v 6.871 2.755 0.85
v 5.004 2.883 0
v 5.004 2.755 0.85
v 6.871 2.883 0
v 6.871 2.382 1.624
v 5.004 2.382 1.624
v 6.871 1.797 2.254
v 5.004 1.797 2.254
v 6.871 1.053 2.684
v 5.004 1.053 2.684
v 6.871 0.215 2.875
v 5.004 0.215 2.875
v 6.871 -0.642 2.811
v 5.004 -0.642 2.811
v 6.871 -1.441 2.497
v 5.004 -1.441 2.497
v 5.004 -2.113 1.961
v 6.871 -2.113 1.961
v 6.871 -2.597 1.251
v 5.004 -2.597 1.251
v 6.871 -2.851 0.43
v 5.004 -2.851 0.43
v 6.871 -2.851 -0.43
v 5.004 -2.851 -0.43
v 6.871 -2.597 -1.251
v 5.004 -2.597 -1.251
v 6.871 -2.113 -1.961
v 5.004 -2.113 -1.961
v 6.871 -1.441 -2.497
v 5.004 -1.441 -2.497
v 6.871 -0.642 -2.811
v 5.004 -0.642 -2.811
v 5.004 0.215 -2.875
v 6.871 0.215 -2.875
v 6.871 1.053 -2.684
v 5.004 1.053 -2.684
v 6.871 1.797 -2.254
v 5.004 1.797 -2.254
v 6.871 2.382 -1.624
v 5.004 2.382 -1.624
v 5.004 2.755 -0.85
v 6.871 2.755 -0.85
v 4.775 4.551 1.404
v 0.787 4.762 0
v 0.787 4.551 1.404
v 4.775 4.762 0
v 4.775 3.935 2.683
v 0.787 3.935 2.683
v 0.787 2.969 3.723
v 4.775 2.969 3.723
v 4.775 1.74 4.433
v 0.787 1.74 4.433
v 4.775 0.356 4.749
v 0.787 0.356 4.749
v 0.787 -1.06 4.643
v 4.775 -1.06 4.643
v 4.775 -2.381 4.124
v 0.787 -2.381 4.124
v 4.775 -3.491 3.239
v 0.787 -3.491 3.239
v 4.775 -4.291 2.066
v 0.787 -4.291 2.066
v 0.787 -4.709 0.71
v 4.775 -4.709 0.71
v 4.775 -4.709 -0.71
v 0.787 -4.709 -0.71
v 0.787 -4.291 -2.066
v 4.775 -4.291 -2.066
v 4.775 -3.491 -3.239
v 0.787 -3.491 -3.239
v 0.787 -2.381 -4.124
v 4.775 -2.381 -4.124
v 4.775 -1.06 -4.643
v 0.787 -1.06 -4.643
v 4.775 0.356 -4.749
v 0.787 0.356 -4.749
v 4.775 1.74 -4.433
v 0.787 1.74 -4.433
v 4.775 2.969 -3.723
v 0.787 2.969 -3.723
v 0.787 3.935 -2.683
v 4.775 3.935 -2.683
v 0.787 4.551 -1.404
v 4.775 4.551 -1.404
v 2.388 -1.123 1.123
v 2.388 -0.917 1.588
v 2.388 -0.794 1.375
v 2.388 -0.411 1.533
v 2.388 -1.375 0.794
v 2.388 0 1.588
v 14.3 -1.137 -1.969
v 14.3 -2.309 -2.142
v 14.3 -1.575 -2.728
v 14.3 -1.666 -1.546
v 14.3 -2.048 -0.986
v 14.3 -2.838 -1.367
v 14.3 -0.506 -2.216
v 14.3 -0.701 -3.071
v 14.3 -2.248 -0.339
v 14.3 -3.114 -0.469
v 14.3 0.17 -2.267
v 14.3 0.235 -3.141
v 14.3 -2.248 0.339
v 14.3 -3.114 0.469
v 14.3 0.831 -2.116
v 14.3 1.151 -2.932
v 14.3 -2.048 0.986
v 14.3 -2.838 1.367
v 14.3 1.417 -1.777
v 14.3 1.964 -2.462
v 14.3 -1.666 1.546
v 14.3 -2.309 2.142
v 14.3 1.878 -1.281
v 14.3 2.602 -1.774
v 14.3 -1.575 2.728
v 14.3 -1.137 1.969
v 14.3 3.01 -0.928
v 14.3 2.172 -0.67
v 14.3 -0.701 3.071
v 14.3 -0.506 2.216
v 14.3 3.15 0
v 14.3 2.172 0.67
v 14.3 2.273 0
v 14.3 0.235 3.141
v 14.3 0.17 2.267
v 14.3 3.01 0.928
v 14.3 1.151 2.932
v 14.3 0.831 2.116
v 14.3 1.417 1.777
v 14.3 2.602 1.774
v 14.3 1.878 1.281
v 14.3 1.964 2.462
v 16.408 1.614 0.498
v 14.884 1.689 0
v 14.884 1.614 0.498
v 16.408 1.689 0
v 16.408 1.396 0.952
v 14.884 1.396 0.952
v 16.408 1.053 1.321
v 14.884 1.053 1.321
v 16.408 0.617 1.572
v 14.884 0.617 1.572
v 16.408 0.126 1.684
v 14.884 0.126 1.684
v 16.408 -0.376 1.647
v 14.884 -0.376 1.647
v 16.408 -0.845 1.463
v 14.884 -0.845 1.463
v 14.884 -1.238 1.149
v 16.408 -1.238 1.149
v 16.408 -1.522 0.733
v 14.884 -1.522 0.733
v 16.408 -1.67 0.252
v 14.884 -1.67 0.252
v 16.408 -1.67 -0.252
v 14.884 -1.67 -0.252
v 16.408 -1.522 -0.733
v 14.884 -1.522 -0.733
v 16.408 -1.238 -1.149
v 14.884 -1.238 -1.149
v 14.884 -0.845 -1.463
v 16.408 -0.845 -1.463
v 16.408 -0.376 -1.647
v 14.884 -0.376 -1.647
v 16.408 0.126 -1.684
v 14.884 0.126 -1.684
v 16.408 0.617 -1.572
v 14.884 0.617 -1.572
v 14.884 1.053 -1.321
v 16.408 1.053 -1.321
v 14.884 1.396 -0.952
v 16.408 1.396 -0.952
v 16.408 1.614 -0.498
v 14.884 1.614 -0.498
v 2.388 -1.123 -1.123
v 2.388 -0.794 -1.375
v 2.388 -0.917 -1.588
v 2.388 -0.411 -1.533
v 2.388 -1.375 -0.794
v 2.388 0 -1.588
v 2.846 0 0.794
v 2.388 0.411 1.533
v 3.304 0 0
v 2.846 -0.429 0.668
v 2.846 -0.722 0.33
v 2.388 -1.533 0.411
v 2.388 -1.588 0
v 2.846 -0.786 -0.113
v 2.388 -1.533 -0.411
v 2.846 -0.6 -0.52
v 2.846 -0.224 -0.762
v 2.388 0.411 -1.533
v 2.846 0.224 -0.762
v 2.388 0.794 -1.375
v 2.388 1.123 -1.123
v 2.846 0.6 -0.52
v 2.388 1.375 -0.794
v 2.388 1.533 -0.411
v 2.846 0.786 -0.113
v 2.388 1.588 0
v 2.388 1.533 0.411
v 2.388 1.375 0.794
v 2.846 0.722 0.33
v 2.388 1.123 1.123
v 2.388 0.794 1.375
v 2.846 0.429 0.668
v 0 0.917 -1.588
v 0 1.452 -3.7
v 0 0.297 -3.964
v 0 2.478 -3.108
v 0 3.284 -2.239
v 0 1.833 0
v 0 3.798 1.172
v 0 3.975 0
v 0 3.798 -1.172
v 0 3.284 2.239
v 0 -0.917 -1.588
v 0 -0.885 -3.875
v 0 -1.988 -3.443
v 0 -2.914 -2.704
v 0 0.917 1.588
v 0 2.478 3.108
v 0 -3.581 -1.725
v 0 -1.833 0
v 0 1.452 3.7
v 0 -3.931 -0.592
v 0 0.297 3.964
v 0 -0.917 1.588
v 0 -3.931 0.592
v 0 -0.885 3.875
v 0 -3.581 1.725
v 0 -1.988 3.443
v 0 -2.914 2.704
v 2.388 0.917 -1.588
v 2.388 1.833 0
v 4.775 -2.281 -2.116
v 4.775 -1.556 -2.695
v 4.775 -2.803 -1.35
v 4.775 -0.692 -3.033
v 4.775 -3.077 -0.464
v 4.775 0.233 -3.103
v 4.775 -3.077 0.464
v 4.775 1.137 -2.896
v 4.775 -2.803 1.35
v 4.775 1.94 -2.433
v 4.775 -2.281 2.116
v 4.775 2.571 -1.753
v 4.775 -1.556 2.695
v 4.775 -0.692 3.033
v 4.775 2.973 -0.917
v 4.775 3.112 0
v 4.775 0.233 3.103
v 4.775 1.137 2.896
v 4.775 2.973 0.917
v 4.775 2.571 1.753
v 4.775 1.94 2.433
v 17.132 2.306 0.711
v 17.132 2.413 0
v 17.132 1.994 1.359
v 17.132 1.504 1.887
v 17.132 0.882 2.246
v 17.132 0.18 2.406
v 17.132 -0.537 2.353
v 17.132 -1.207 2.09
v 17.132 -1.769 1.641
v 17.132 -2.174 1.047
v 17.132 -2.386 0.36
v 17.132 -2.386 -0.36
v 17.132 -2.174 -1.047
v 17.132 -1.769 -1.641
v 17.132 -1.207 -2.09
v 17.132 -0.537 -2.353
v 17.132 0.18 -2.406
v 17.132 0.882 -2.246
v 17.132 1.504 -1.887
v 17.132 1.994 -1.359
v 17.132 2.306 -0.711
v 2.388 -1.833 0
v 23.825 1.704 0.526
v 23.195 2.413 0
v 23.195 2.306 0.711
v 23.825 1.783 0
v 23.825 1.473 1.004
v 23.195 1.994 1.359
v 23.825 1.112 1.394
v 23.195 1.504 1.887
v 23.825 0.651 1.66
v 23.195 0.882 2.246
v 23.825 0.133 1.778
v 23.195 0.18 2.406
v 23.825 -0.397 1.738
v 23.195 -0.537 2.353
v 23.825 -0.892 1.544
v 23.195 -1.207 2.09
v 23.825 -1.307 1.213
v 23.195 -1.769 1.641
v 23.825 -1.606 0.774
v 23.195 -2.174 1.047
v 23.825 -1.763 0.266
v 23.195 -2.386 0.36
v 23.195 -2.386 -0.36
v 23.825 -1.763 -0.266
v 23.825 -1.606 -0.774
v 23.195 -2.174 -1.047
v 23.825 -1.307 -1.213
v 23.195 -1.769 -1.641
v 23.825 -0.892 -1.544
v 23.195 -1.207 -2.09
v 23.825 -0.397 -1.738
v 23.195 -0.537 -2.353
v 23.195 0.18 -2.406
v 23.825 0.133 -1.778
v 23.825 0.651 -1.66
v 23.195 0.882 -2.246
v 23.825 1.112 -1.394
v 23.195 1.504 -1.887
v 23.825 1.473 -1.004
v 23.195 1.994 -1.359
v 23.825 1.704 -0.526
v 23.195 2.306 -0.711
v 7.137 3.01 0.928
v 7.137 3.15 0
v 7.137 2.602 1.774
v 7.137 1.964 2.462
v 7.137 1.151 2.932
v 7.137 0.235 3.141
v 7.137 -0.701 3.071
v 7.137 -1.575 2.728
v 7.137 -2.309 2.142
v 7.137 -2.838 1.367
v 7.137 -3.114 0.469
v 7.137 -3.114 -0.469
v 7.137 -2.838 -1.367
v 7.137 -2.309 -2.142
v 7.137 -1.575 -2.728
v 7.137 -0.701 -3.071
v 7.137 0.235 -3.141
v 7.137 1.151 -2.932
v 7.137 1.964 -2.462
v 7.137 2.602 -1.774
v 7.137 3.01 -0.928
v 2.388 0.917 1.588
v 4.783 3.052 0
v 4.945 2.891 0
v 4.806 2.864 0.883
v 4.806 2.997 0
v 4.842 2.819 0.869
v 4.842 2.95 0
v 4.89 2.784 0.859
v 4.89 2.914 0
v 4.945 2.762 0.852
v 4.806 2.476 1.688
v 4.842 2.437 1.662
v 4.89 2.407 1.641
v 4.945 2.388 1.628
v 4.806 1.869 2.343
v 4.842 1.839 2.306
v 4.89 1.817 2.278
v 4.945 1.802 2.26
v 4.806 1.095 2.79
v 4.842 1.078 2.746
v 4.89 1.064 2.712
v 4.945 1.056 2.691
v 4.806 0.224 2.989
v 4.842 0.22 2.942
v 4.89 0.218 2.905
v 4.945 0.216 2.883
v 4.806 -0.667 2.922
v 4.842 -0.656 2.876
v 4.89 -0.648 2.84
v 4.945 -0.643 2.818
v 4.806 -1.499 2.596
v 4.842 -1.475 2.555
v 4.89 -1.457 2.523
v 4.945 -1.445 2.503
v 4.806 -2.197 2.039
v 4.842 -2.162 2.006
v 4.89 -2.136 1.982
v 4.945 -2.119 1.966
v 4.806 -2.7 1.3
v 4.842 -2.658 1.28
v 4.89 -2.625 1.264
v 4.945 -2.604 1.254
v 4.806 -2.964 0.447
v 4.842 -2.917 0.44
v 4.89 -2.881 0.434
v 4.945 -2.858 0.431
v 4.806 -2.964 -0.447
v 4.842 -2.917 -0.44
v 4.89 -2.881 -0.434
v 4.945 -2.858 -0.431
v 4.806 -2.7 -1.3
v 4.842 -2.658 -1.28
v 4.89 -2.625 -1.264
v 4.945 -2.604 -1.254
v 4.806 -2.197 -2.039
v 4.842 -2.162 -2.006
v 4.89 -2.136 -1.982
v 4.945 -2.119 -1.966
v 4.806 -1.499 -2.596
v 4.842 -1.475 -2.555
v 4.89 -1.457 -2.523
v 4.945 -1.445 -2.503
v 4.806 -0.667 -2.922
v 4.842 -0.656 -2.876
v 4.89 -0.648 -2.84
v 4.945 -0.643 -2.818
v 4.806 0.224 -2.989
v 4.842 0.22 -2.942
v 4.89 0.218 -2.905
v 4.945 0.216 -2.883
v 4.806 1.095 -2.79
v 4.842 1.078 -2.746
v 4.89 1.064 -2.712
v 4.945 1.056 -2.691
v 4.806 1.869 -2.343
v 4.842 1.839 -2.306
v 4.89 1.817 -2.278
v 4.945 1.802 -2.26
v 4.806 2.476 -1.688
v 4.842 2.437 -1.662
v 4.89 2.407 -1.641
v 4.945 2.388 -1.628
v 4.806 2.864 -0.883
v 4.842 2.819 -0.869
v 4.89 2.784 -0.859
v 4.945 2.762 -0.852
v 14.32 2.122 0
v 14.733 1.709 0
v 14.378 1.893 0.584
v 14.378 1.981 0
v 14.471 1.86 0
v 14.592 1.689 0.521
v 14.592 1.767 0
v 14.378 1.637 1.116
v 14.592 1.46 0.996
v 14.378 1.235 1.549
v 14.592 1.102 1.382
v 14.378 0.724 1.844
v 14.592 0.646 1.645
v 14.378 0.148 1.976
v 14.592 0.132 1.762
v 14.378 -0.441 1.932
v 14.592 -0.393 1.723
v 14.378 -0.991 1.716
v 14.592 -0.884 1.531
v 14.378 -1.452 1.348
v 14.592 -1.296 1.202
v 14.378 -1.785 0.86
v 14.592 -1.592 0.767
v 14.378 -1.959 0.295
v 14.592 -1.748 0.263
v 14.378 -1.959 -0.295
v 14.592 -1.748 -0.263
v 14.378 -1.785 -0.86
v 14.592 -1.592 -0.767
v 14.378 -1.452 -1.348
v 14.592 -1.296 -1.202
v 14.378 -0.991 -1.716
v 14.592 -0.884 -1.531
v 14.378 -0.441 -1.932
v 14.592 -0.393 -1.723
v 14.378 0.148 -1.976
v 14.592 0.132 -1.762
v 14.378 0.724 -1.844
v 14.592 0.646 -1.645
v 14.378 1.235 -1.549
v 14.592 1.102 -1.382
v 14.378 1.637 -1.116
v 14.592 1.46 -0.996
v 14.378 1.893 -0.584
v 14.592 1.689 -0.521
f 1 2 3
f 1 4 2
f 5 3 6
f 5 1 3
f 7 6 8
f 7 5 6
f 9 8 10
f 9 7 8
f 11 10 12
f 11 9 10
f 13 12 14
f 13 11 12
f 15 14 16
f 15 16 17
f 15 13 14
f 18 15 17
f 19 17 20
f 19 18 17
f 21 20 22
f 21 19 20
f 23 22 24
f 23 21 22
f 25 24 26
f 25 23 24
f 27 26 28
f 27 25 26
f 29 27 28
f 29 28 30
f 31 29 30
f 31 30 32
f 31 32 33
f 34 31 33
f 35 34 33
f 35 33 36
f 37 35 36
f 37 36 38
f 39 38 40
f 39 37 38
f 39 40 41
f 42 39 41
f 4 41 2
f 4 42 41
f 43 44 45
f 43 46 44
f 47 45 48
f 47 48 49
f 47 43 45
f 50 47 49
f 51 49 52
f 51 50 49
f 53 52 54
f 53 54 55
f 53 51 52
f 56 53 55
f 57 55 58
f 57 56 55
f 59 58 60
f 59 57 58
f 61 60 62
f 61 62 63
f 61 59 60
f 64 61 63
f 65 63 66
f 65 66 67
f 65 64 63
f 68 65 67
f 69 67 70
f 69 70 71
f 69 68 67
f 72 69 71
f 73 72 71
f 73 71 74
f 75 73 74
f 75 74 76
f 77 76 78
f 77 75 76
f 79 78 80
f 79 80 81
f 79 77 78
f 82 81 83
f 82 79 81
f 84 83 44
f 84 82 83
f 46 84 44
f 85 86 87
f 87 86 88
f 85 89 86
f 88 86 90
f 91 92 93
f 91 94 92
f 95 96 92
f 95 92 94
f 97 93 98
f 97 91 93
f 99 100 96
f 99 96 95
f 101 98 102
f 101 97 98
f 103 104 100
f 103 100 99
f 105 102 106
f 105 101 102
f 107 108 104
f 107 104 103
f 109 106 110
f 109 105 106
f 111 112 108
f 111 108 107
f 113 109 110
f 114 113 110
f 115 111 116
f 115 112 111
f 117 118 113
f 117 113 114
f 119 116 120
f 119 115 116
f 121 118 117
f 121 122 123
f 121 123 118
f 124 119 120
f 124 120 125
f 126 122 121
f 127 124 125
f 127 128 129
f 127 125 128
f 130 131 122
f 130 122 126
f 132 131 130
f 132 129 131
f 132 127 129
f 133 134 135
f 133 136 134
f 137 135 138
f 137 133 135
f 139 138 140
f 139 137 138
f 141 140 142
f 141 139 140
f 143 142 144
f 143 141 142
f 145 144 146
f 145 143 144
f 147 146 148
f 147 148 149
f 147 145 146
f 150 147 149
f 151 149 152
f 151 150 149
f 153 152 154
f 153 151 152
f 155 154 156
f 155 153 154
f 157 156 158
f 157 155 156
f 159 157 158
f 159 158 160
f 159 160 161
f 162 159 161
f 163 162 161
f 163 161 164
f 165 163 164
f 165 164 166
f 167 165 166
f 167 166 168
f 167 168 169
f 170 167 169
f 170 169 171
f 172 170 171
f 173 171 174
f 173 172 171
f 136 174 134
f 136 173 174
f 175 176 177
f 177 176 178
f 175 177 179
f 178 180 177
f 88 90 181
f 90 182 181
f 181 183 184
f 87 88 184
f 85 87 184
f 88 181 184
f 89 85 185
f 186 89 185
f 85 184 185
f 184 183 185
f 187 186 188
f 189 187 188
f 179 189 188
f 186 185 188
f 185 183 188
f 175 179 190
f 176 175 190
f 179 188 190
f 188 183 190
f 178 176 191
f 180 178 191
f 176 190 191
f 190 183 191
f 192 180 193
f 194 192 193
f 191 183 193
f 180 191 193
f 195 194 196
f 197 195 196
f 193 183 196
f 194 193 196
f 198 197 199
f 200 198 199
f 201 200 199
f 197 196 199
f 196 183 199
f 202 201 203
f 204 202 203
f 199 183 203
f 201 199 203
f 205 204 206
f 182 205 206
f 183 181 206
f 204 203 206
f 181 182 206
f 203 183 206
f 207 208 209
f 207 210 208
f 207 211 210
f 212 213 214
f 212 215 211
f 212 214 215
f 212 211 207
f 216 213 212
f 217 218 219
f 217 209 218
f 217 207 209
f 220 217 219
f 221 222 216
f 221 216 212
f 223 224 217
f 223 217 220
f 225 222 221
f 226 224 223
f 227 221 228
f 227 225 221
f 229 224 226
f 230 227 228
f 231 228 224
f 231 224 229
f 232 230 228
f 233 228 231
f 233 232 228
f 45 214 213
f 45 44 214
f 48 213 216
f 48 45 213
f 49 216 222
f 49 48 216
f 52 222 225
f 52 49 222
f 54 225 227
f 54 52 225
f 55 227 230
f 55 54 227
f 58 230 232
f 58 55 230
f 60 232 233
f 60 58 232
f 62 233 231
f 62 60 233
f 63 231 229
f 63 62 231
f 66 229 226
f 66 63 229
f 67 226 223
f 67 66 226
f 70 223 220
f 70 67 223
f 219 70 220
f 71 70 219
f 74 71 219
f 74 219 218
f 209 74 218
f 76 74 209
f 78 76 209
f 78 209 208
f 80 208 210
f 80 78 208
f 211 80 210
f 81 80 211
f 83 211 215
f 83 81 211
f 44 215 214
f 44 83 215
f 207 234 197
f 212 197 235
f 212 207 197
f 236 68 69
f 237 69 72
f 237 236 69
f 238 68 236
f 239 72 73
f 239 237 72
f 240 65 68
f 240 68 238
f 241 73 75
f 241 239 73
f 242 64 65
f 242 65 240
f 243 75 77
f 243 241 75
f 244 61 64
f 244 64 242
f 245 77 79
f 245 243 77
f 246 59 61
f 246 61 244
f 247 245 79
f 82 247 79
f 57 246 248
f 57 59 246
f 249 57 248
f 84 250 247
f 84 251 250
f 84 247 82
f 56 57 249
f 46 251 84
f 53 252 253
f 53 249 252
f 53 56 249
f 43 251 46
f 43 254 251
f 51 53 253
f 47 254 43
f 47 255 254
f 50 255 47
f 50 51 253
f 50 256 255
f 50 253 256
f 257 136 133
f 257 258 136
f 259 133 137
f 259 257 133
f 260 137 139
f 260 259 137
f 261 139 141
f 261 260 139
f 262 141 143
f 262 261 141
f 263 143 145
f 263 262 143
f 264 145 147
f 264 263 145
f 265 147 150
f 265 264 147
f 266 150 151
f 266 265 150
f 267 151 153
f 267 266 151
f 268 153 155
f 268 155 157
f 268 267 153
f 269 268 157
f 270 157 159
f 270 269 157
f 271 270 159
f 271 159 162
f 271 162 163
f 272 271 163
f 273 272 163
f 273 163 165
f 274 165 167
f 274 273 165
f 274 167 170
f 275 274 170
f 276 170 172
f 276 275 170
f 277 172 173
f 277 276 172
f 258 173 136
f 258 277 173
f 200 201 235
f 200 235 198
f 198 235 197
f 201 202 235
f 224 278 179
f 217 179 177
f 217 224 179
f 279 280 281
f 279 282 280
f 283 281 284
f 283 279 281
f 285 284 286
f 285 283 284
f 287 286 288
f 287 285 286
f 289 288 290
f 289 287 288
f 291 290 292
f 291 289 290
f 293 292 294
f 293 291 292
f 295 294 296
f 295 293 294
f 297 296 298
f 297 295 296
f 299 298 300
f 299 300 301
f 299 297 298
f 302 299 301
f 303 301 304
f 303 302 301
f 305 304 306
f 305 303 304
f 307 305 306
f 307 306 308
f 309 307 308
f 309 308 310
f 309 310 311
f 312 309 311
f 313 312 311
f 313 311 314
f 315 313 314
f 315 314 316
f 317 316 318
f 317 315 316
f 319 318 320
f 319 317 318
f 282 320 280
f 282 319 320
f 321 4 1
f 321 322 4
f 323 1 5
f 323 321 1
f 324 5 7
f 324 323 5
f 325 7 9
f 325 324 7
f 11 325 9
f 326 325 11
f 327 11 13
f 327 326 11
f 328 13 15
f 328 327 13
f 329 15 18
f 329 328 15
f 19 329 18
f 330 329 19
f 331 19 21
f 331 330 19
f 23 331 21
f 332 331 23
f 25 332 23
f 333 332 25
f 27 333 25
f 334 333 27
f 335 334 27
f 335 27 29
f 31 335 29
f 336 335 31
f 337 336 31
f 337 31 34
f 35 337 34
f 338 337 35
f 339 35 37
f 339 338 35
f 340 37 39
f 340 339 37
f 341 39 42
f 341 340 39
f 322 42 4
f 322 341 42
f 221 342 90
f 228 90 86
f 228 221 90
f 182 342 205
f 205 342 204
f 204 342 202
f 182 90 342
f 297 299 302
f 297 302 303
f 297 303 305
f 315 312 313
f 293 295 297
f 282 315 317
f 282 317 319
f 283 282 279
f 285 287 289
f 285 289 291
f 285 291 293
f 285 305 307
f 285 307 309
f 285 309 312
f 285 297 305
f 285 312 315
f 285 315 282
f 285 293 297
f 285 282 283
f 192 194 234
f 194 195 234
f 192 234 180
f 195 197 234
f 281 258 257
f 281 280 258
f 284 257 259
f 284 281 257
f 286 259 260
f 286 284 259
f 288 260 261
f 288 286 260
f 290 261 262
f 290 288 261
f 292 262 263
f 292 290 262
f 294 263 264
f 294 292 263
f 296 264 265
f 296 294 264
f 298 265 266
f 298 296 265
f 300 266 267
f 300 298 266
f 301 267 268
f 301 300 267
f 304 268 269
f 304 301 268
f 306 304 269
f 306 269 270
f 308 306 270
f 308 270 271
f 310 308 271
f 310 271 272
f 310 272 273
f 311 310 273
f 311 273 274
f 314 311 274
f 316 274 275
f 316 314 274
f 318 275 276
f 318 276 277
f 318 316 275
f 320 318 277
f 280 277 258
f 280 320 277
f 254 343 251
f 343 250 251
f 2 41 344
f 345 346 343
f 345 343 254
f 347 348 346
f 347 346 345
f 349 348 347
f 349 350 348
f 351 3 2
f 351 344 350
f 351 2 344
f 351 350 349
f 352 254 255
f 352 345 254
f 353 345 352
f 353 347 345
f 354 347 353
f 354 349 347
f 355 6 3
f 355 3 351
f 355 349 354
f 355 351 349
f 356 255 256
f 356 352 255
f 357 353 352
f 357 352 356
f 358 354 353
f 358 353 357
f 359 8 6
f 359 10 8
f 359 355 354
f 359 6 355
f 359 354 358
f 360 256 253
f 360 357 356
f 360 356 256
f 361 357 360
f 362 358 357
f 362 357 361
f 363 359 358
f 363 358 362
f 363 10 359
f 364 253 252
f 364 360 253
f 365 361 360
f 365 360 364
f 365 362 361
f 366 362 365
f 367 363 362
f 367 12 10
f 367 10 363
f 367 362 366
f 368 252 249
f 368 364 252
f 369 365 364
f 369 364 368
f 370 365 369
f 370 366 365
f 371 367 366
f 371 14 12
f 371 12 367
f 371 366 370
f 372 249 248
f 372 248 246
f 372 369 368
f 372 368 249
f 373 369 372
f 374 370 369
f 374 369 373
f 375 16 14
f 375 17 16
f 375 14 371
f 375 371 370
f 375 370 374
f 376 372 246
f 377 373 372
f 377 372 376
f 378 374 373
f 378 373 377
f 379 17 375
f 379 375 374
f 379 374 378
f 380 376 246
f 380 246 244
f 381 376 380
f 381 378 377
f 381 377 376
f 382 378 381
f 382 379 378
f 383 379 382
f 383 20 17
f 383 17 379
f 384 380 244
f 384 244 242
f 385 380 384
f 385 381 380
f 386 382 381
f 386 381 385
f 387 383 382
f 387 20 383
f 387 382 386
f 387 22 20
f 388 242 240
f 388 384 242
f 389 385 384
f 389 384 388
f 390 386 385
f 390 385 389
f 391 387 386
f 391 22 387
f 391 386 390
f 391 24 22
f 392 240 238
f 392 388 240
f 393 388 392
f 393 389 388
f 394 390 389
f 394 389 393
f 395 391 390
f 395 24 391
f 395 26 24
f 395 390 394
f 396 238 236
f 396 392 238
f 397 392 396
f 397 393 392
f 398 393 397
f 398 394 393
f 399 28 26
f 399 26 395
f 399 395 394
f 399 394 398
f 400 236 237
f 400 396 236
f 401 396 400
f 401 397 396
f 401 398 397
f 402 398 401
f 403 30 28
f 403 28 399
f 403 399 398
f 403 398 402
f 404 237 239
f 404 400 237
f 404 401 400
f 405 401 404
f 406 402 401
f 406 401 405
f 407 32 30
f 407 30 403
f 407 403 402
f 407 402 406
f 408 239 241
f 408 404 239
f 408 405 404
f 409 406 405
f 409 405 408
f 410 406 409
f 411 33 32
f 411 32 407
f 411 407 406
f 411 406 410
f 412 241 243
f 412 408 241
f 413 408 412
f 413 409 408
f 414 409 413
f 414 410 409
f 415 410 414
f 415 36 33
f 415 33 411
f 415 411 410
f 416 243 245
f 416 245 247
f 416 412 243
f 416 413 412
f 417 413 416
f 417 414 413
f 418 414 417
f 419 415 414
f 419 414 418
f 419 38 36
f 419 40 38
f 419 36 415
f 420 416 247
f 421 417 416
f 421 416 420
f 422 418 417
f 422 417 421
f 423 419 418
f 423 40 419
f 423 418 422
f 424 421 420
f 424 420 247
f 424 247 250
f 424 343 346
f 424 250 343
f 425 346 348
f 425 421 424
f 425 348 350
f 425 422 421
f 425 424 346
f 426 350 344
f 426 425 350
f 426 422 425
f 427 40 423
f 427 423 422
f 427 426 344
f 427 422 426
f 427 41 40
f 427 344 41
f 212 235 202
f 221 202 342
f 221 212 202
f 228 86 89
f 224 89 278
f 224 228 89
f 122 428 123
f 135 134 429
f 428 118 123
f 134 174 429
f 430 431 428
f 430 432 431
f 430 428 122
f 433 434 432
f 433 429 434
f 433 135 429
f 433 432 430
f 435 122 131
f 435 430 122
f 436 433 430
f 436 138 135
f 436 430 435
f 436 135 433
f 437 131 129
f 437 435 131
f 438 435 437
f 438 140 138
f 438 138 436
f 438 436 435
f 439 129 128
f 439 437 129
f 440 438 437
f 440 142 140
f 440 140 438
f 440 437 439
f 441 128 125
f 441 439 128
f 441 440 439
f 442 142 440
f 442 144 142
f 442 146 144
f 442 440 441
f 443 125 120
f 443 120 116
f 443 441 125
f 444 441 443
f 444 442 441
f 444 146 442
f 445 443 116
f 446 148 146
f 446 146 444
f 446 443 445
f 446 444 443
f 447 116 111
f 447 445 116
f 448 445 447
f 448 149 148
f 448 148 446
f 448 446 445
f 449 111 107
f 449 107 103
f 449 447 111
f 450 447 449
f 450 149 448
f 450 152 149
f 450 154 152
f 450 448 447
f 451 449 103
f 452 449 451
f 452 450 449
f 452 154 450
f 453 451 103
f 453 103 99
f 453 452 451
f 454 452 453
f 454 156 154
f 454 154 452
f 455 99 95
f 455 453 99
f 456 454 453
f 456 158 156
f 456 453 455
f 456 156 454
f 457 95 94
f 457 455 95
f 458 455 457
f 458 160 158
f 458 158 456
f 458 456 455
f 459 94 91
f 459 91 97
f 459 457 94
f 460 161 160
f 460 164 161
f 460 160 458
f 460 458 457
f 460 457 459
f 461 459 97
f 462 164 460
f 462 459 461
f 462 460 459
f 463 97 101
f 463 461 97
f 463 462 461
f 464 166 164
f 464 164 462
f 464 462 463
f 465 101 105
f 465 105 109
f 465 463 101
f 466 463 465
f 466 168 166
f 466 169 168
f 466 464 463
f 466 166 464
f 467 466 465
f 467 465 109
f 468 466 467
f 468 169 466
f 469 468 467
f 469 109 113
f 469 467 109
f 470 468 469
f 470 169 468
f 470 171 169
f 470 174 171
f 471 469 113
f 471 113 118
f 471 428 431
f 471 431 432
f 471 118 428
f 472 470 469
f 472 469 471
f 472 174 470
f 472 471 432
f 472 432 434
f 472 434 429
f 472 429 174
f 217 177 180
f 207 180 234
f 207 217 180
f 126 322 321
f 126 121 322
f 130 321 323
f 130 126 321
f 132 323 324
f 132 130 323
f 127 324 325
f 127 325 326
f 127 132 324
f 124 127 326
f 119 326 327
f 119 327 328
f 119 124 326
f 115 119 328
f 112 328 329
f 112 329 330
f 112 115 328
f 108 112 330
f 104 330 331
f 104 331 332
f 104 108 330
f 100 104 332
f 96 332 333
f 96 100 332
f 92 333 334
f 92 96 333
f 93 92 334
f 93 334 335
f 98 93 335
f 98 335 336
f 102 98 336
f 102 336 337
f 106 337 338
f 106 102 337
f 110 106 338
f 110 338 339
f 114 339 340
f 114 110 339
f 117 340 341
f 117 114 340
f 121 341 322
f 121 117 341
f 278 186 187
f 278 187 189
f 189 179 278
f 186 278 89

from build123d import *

# Parameters (mm, degrees)
HEX_2_DEPTH = 2.3876


# Read off the part's stored shape, not the designer's step: ThreadSchematic
with BuildPart() as part:
    # ThreadSchematic outline → ThreadSchematic (revolve)
    with BuildSketch(Plane.YX):
        with BuildLine():
            Line((0, 23.8252), (0, 0))
            Line((0, 0), (3.9751, 0))
            Line((3.9751, 0), (4.7625, 0.7874))
            Line((4.7625, 0.7874), (4.7625, 4.7752))
            Line((4.7625, 4.7752), (3.1115, 4.7752))
            ThreePointArc((3.1115, 4.7752), (2.94985539, 4.84215539), (2.8829, 5.0038))
            Line((2.8829, 5.0038), (2.8829, 6.8707))
            Line((2.8829, 6.8707), (3.1496, 7.1374))
            Line((3.1496, 7.1374), (3.1496, 14.3002))
            Line((3.1496, 14.3002), (2.2733, 14.3002))
            ThreePointArc((2.2733, 14.3002), (1.860208218, 14.471308218), (1.6891, 14.8844))
            Line((1.6891, 14.8844), (1.6891, 16.4084))
            Line((1.6891, 16.4084), (2.413, 17.1323))
            Line((2.413, 17.1323), (2.413, 23.19528))
            Line((2.413, 23.19528), (1.78308, 23.8252))
            Line((1.78308, 23.8252), (0, 23.8252))
        make_face()
    revolve(axis=Axis((0, 0, 0), (1, 0, 0)))

    # Sketch2 → PreBroach (revolve, cut)
    with BuildSketch(Plane.XY, mode=Mode.PRIVATE) as prebroach_sk:
        Polygon((0, 1.5875), (2.3876, 1.5875), (3.304143552, 0), (0, 0), align=None)
    revolve(prebroach_sk.sketch.rotate(Axis((0, 0, 0), (1, 0, 0)), 90), axis=Axis((0, 0, 0), (1, 0, 0)), mode=Mode.SUBTRACT)

    # Sketch3 → Hex 2 (cut)
    with BuildSketch(Plane.ZY):
        Polygon((-1.5875, -0.916543552), (-1.5875, 0.916543552), (0, 1.833087105), (1.5875, 0.916543552), (1.5875, -0.916543552), (0, -1.833087105), align=None)
    extrude(amount=-HEX_2_DEPTH, mode=Mode.SUBTRACT)


solid = part.part
